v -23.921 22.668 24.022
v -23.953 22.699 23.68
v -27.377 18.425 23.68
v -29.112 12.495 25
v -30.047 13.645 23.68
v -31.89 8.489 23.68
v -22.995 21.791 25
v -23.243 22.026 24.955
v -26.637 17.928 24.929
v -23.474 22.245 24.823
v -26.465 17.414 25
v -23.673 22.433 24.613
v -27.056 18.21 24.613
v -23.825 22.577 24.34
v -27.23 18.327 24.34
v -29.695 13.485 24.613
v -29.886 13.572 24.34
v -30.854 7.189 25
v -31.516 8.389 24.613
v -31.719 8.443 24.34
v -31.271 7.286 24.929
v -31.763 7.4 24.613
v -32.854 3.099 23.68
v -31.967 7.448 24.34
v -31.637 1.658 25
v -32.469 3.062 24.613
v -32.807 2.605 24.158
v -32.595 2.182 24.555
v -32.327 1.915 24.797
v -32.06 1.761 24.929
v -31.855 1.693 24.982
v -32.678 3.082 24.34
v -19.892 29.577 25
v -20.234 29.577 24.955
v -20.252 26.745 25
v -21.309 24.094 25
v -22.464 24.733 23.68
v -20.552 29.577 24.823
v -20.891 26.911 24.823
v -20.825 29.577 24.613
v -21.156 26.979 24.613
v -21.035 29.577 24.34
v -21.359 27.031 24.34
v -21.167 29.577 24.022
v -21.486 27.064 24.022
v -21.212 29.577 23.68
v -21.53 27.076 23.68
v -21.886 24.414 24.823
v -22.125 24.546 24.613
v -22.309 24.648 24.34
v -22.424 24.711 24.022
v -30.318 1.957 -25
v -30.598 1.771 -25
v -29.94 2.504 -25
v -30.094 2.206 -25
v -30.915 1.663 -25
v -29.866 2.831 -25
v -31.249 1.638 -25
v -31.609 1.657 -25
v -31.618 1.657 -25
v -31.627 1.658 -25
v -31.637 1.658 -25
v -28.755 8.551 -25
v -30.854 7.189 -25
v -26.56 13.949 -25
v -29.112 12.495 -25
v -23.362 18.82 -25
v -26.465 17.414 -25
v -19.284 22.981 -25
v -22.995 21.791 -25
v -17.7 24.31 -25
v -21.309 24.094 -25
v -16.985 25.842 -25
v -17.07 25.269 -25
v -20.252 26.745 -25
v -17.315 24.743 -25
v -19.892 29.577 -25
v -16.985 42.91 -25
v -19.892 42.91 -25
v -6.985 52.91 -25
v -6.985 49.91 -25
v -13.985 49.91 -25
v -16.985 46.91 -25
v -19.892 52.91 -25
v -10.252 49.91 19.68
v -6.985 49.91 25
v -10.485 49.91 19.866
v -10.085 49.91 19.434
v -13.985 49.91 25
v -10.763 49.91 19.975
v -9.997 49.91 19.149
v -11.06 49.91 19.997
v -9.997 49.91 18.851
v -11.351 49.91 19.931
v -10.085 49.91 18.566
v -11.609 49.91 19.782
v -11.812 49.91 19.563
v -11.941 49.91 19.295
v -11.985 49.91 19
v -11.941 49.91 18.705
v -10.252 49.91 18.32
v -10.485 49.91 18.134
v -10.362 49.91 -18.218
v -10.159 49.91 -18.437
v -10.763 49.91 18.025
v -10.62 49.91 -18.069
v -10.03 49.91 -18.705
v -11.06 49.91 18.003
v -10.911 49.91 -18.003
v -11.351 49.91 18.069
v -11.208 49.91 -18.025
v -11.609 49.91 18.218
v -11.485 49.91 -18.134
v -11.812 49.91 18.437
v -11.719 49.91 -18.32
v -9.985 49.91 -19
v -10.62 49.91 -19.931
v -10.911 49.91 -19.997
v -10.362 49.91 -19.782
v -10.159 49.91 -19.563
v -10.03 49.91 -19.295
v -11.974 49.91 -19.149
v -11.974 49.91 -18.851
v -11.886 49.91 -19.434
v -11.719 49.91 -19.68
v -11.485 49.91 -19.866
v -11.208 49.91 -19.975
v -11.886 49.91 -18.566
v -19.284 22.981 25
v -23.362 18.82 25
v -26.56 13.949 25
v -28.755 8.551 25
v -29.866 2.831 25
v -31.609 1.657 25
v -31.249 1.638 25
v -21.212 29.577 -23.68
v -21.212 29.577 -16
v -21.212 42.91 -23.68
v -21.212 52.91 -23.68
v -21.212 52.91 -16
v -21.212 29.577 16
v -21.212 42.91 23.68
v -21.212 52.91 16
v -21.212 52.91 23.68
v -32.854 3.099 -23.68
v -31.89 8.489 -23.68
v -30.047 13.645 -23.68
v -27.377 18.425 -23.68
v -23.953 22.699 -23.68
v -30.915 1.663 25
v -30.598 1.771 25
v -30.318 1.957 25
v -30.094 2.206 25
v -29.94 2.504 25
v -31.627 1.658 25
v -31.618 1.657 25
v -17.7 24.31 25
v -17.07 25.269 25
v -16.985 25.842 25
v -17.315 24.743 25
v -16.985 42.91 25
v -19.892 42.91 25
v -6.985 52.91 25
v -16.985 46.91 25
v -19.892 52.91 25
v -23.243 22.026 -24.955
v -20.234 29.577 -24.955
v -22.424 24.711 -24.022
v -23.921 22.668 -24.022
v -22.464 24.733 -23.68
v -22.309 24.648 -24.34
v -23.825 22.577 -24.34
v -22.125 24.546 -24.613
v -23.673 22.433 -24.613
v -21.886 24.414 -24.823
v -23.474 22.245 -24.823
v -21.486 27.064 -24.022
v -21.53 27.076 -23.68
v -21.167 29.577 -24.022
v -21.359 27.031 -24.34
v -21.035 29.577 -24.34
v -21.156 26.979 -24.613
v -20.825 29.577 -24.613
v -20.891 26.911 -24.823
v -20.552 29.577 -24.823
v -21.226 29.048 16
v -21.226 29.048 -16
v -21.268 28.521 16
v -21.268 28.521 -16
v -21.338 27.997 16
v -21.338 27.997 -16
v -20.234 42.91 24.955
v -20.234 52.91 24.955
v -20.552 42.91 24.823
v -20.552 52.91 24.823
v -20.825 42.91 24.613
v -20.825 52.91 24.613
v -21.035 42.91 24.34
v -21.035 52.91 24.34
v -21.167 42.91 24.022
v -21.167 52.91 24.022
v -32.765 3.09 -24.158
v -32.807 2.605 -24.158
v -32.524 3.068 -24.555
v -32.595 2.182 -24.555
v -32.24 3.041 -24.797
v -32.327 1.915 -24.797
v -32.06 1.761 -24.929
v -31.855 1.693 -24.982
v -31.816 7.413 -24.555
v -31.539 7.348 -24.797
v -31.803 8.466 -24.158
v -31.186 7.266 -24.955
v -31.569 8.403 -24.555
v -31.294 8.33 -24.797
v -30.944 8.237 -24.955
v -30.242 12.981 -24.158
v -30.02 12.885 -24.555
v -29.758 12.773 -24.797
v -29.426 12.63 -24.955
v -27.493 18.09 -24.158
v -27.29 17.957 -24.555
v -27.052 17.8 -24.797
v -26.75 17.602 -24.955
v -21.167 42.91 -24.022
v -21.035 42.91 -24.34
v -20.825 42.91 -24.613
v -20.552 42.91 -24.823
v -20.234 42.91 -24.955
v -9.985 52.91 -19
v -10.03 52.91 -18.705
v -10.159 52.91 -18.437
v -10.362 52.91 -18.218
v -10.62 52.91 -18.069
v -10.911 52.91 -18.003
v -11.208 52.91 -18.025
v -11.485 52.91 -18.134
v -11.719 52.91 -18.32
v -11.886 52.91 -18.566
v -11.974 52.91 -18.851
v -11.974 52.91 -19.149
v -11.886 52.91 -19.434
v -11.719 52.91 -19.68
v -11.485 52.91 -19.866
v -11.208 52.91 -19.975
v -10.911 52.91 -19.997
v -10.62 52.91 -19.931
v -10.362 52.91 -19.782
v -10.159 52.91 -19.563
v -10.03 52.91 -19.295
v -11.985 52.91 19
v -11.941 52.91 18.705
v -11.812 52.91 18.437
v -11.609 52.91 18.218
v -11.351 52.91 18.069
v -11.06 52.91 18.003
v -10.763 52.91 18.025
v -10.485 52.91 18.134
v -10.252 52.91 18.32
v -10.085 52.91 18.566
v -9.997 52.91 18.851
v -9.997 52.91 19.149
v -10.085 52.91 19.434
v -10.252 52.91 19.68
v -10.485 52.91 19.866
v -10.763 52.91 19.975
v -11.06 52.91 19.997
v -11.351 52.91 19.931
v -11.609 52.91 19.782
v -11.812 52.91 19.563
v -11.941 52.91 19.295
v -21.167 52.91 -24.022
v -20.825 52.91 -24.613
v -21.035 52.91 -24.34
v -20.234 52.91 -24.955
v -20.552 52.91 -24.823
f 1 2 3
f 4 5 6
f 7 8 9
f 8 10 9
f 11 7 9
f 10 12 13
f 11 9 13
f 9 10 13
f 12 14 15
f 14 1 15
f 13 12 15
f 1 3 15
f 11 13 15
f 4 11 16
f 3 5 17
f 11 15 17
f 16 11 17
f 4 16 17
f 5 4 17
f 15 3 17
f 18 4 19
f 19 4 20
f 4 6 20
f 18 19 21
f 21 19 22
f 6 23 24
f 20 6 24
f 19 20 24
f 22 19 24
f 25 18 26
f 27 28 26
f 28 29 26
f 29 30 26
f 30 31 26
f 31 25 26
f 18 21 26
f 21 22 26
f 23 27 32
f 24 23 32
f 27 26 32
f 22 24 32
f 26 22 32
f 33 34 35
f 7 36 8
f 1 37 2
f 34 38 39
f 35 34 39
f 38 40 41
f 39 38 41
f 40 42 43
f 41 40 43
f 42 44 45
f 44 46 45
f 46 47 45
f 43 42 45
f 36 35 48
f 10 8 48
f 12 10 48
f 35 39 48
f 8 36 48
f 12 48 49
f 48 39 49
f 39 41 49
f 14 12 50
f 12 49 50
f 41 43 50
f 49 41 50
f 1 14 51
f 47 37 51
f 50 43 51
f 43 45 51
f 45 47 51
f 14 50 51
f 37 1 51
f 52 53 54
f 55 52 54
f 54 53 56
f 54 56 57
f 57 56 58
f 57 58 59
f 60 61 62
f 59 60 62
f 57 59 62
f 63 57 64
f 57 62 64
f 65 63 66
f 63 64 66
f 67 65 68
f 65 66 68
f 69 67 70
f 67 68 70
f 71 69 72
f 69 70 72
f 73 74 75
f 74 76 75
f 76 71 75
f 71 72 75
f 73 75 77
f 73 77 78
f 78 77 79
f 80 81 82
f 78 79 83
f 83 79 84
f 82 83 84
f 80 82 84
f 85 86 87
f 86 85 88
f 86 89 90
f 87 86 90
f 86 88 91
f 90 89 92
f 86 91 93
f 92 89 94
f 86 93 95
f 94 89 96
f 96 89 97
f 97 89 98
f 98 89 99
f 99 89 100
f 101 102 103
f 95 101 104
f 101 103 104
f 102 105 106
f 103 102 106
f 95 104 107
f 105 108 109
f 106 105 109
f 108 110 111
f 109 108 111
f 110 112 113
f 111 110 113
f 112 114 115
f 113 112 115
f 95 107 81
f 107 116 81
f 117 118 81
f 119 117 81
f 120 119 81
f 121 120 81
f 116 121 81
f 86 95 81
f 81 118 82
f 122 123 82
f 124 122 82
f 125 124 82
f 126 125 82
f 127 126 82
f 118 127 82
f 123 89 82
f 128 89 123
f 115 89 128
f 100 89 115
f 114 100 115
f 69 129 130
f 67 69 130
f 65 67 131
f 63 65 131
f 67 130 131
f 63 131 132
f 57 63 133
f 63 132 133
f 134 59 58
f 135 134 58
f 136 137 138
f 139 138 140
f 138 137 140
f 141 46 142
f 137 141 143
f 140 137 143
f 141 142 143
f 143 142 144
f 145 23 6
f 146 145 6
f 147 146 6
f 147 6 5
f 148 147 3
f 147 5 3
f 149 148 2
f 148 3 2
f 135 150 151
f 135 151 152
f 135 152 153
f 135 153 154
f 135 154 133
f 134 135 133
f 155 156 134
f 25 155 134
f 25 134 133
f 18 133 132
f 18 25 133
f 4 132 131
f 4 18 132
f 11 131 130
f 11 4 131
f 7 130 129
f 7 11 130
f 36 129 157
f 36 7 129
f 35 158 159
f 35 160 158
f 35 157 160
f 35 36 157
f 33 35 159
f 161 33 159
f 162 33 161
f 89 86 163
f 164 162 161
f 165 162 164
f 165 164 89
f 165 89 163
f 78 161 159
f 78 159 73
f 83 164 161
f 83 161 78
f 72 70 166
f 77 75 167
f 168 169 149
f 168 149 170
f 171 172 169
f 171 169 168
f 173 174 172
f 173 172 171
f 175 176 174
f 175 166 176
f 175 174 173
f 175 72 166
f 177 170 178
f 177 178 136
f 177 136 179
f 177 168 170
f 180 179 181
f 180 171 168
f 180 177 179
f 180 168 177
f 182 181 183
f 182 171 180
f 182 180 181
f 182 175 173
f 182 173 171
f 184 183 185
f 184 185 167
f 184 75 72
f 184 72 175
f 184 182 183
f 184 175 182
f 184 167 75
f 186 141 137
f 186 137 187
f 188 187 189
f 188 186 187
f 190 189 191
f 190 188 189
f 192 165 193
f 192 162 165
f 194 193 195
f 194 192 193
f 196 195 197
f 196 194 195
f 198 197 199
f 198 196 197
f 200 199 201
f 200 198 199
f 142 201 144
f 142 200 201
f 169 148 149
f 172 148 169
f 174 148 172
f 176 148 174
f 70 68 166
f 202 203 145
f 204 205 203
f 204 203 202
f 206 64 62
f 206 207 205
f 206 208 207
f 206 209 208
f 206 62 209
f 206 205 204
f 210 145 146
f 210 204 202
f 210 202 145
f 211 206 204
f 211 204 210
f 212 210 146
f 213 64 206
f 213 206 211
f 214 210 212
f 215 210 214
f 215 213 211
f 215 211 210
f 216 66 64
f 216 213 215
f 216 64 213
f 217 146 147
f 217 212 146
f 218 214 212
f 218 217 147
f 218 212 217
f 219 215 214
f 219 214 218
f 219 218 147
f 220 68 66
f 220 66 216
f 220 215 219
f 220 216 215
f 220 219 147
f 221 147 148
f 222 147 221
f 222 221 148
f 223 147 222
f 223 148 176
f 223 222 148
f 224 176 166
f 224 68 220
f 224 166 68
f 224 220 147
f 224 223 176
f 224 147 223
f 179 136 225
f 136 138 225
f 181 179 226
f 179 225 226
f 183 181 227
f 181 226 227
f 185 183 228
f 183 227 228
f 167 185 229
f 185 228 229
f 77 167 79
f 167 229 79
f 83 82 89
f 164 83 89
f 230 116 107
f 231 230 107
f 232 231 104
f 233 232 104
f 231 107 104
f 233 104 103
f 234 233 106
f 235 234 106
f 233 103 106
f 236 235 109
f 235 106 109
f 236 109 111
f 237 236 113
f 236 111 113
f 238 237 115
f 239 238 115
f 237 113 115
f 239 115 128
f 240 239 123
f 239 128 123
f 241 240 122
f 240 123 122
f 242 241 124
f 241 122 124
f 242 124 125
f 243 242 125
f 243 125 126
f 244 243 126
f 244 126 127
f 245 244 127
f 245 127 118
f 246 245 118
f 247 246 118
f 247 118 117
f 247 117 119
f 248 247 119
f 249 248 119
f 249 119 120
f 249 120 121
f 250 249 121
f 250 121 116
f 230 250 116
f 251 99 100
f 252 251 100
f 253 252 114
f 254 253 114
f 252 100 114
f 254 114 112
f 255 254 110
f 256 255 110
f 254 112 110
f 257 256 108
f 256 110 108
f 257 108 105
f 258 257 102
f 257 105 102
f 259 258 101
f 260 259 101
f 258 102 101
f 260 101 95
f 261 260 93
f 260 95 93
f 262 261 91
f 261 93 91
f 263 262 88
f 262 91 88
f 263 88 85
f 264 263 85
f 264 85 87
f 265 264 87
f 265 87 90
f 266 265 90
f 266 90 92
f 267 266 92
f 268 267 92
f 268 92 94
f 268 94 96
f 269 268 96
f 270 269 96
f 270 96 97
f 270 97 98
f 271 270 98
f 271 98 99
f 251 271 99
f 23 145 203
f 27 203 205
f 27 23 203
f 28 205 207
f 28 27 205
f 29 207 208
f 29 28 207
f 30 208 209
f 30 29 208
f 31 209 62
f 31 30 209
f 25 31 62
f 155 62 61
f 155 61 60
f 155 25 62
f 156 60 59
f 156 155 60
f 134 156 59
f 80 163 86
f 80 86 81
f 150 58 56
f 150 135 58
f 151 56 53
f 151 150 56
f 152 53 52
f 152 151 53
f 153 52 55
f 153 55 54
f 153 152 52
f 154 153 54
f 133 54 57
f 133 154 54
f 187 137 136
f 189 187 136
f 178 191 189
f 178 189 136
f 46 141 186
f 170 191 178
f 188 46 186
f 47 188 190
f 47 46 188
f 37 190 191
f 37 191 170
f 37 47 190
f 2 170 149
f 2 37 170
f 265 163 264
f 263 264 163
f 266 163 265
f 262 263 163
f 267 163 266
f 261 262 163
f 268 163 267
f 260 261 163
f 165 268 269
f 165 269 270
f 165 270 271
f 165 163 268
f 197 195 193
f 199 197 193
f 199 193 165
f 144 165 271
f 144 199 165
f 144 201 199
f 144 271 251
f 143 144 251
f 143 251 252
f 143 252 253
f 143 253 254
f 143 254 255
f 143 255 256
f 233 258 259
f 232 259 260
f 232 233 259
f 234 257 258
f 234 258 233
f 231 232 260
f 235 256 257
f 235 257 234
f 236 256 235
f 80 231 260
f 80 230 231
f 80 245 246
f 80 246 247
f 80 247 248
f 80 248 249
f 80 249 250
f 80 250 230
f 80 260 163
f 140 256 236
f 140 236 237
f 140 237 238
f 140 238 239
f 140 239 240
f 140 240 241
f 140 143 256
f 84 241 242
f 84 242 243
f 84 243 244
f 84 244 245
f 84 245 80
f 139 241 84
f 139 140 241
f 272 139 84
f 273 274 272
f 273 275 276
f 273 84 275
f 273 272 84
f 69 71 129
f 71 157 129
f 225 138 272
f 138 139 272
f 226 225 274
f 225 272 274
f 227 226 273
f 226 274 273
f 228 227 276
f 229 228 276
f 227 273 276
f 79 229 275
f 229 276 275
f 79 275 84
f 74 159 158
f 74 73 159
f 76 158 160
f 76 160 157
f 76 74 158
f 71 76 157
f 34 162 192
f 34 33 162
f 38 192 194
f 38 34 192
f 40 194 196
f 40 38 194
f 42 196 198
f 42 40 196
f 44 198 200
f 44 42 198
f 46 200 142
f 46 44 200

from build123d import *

# Parameters (mm, degrees)
EXTRUDE_1_DEPTH             = 25
EXTRUDE_3_DEPTH             = 25
CUT_EXTRUDE_1_DEPTH         = 53.179559149
CUT_EXTRUDE_1_DEPTH_BACK    = 53.179559149
SKETCH_4_W                  = 32
SKETCH_4_H                  = 14.912747354
FILLET_1_R                  = 10
FILLET_17_R                 = 2
CUT_EXTRUDE_5_DEPTH         = 60.625850278
CUT_EXTRUDE_5_DEPTH_BACK    = 60.625850278
CUT_EXTRUDE_6_DEPTH         = 60.600832153
CUT_EXTRUDE_6_DEPTH_BACK    = 60.600832153
SKETCH_9_W                  = 7
SKETCH_9_H                  = 3
SKETCH_10_W                 = 4.226496159
SKETCH_10_H                 = 9
EXTRUDE_4_DEPTH             = 10
SKETCH_12_W                 = 50
SKETCH_12_H                 = 3
EXTRUDE_6_DEPTH             = 10
EXTRUDE_6_DIRECTION_2_REACH = 62.659
SKETCH_14_R                 = 1
CUT_EXTRUDE_8_DEPTH         = 64.621818473
FILLET_50_R                 = 1.32
SKETCH_16_W                 = 32
SKETCH_16_H                 = 21.912747354
EXTRUDE_7_DEPTH             = 4.226496158
EXTRUDE_START               = 32
EXTRUDE_8_DEPTH             = 32
CHAMFER_1_SIZE              = 3


with BuildPart() as part:
    # 草图1 → 凸台-拉伸1 (new, symmetric)
    with BuildSketch(Plane.XY):
        with BuildLine():
            ThreePointArc((-33, 0), (-29.908156972, 13.946402637), (-21.21199112, 25.279466623))
            Line((-21.21199112, 25.279466623), (-16.985494961, 24.909696123))
            Line((-16.985494961, 24.909696123), (-19.283628291, 22.981333294))
            ThreePointArc((-19.283628291, 22.981333294), (-27.189233611, 12.678547852), (-30, 0))
            Line((-30, 0), (-33, 0))
        make_face()
    extrude(amount=EXTRUDE_1_DEPTH, both=True)

    # 草图1<7> → 凸台-拉伸3 (add, symmetric)
    with BuildSketch(Plane.XY):
        Polygon((-21.21199112, 25.279466623), (-21.21199112, 39.909696123), (-28.21199112, 39.909696123), (-28.21199112, 42.909696123), (-16.985494961, 42.909696123), (-16.985494961, 39.909696123), (-16.985494961, 24.909696123), align=None)
    extrude(amount=EXTRUDE_3_DEPTH, both=True)

    # 草图4 → 切除-拉伸1 (cut, two sides: drawn at the far end of the back side and taken through both)
    with BuildSketch(Plane(origin=(-16.985494961, 0, 0), x_dir=(0, 0, -1), z_dir=(1, 0, 0)).offset(-CUT_EXTRUDE_1_DEPTH_BACK)):
        with Locations((0, 35.453322446)):
            Rectangle(SKETCH_4_W, SKETCH_4_H)
    extrude(amount=CUT_EXTRUDE_1_DEPTH + CUT_EXTRUDE_1_DEPTH_BACK, mode=Mode.SUBTRACT)

    # 圆角1
    # the kernel refuses this fillet: 10 mm, written as the material it adds along each edge
    with BuildSketch(Plane(origin=(-21.21199112, 25.279466623, 25), x_dir=(-0.7281290100330119, -0.6854401102564294, 0), z_dir=(0, 0, -1))) as fillet_1_piece_1_section:
        with BuildLine():
            CenterArc((4.335441405, 9.983715921), FILLET_1_R, 223.270229162, 43.459541677)
            Line((-2.945848695, 3.129314818), (0, 0))
            ThreePointArc((0, 0), (1.882494294, 0.053737462), (3.764988589, 0))
        make_face()
    fillet_1_piece_1 = extrude(amount=50, mode=Mode.PRIVATE)
    fillet_1_piece_1 = split(fillet_1_piece_1, bisect_by=Plane(origin=(-21.85438977, 25.398045646, 16), z_dir=(0, 0, 1)), keep=Keep.TOP, mode=Mode.PRIVATE)
    fillet_1_piece_1 = split(fillet_1_piece_1, bisect_by=Plane(origin=(-21.85438977, 27.996948769, 20.5), z_dir=(0, -1, 0)), keep=Keep.TOP, mode=Mode.PRIVATE)
    add(fillet_1_piece_1)
    with BuildSketch(Plane(origin=(-21.21199112, 25.279466623, 25), x_dir=(-0.7281290100330119, -0.6854401102564294, 0), z_dir=(0, 0, -1))) as fillet_1_piece_2_section:
        with BuildLine():
            CenterArc((4.335441405, 9.983715921), FILLET_1_R, 223.270229162, 43.459541677)
            Line((-2.945848695, 3.129314818), (0, 0))
            ThreePointArc((0, 0), (1.882494294, 0.053737462), (3.764988589, 0))
        make_face()
    fillet_1_piece_2 = extrude(amount=50, mode=Mode.PRIVATE)
    fillet_1_piece_2 = split(fillet_1_piece_2, bisect_by=Plane(origin=(-21.135777092, 28.718730095, 16), z_dir=(0, 0, 1)), keep=Keep.TOP, mode=Mode.PRIVATE)
    fillet_1_piece_2 = split(fillet_1_piece_2, bisect_by=Plane(origin=(-21.135777092, 27.996948769, 20.5), z_dir=(0, 1, 0)), keep=Keep.TOP, mode=Mode.PRIVATE)
    add(fillet_1_piece_2)
    with BuildSketch(Plane(origin=(-21.21199112, 25.279466623, 25), x_dir=(-0.7281290100330119, -0.6854401102564294, 0), z_dir=(0, 0, -1))) as fillet_1_piece_3_section:
        with BuildLine():
            CenterArc((4.335441405, 9.983715921), FILLET_1_R, 223.270229162, 43.459541677)
            Line((-2.945848695, 3.129314818), (0, 0))
            ThreePointArc((0, 0), (1.882494294, 0.053737462), (3.764988589, 0))
        make_face()
    fillet_1_piece_3 = extrude(amount=50, mode=Mode.PRIVATE)
    fillet_1_piece_3 = split(fillet_1_piece_3, bisect_by=Plane(origin=(-21.85438977, 25.398045646, 16), z_dir=(0, 0, -1)), keep=Keep.TOP, mode=Mode.PRIVATE)
    fillet_1_piece_3 = split(fillet_1_piece_3, bisect_by=Plane(origin=(-21.85438977, 27.996948769, 0), z_dir=(0, -1, 0)), keep=Keep.TOP, mode=Mode.PRIVATE)
    fillet_1_piece_3 = split(fillet_1_piece_3, bisect_by=Plane(origin=(-21.85438977, 25.398045646, -16), z_dir=(0, 0, 1)), keep=Keep.TOP, mode=Mode.PRIVATE)
    add(fillet_1_piece_3)
    with BuildSketch(Plane(origin=(-21.21199112, 25.279466623, 25), x_dir=(-0.7281290100330119, -0.6854401102564294, 0), z_dir=(0, 0, -1))) as fillet_1_piece_4_section:
        with BuildLine():
            CenterArc((4.335441405, 9.983715921), FILLET_1_R, 223.270229162, 43.459541677)
            Line((-2.945848695, 3.129314818), (0, 0))
            ThreePointArc((0, 0), (1.882494294, 0.053737462), (3.764988589, 0))
        make_face()
    fillet_1_piece_4 = extrude(amount=50, mode=Mode.PRIVATE)
    fillet_1_piece_4 = split(fillet_1_piece_4, bisect_by=Plane(origin=(-21.85438977, 27.996948769, -20.5), z_dir=(0, -1, 0)), keep=Keep.TOP, mode=Mode.PRIVATE)
    fillet_1_piece_4 = split(fillet_1_piece_4, bisect_by=Plane(origin=(-21.85438977, 25.398045646, -16), z_dir=(0, 0, -1)), keep=Keep.TOP, mode=Mode.PRIVATE)
    add(fillet_1_piece_4)
    with BuildSketch(Plane(origin=(-21.21199112, 25.279466623, 25), x_dir=(-0.7281290100330119, -0.6854401102564294, 0), z_dir=(0, 0, -1))) as fillet_1_piece_5_section:
        with BuildLine():
            CenterArc((4.335441405, 9.983715921), FILLET_1_R, 223.270229162, 43.459541677)
            Line((-2.945848695, 3.129314818), (0, 0))
            ThreePointArc((0, 0), (1.882494294, 0.053737462), (3.764988589, 0))
        make_face()
    fillet_1_piece_5 = extrude(amount=50, mode=Mode.PRIVATE)
    fillet_1_piece_5 = split(fillet_1_piece_5, bisect_by=Plane(origin=(-21.135777092, 27.996948769, -20.5), z_dir=(0, 1, 0)), keep=Keep.TOP, mode=Mode.PRIVATE)
    fillet_1_piece_5 = split(fillet_1_piece_5, bisect_by=Plane(origin=(-21.135777092, 28.718730095, -16), z_dir=(0, 0, -1)), keep=Keep.TOP, mode=Mode.PRIVATE)
    add(fillet_1_piece_5)

    # 圆角17
    fillet_17_edges = [part.edges().sort_by_distance(p)[0] for p in [
        (-16.985494961, 24.909696123, 0),
    ]]
    fillet(fillet_17_edges, radius=FILLET_17_R)

    # 草图7 → 切除-拉伸5 (cut, two sides: drawn at the far end of the back side and taken through both)
    with BuildSketch(Plane.XY.offset(-CUT_EXTRUDE_5_DEPTH_BACK)):
        with BuildLine():
            Line((0, 0), (-33, 0))
            ThreePointArc((-33, 0), (-32.988691724, 0.863839294), (-32.954774647, 1.727086556))
            Line((-32.954774647, 1.727086556), (0, 0))
        make_face()
    extrude(amount=CUT_EXTRUDE_5_DEPTH + CUT_EXTRUDE_5_DEPTH_BACK, mode=Mode.SUBTRACT)

    # 草图9 → 切除-拉伸6 (cut, two sides: drawn at the far end of the back side and taken through both)
    with BuildSketch(Plane.XY.offset(-CUT_EXTRUDE_6_DEPTH_BACK)):
        with Locations((-24.71199112, 41.409696123)):
            Rectangle(SKETCH_9_W, SKETCH_9_H)
    extrude(amount=CUT_EXTRUDE_6_DEPTH + CUT_EXTRUDE_6_DEPTH_BACK, mode=Mode.SUBTRACT)

    # 草图10 → 凸台-拉伸4 (add)
    with BuildSketch(Plane(origin=(0, 42.909696123, 0), x_dir=(1, 0, 0), z_dir=(0, 1, 0))):
        with Locations((-19.098743041, 20.5)):
            Rectangle(SKETCH_10_W, SKETCH_10_H)
        with Locations((-19.098743041, -20.5)):
            Rectangle(SKETCH_10_W, SKETCH_10_H)
    extrude(amount=EXTRUDE_4_DEPTH)

    # 草图12 → 凸台-拉伸6 (add)
    with BuildSketch(Plane(origin=(-16.985494961, 0, 0), x_dir=(0, 0, -1), z_dir=(1, 0, 0))):
        with Locations((0, 51.409696123)):
            Rectangle(SKETCH_12_W, SKETCH_12_H)
    extrude(amount=EXTRUDE_6_DEPTH)

    # 凸台-拉伸6 direction 2: up to this face of the body (flat: up to its plane)
    extrude_6_direction_2_end = Plane(part.part.faces().sort_by_distance((-21.21199112, 41.24345525, 20.5))[0])
    # 草图12 → 凸台-拉伸6 direction 2 (add, up to the picked face)
    with BuildSketch(Plane(origin=(-16.985494961, 0, 0), x_dir=(0, 0, -1), z_dir=(1, 0, 0)), mode=Mode.PRIVATE) as extrude_6_direction_2_sk1:
        with Locations((0, 51.409696123)):
            Rectangle(SKETCH_12_W, SKETCH_12_H)
    extrude_6_direction_2_tool1 = split(extrude(extrude_6_direction_2_sk1.sketch, amount=-EXTRUDE_6_DIRECTION_2_REACH, mode=Mode.PRIVATE), bisect_by=extrude_6_direction_2_end, keep=Keep.BOTH, mode=Mode.PRIVATE)
    add(extrude_6_direction_2_tool1.solids().sort_by(Axis((-16.985495, 51.409696, 0), (-1, 0, 0)))[0])

    # 草图14 → 切除-拉伸8 (cut, through all)
    with BuildSketch(Plane(origin=(0, 49.909696123, 0), x_dir=(-1, 0, 0), z_dir=(0, -1, 0))):
        with Locations(Location((10.985494961, 19, 0), (0, 0, 180))):
            Circle(SKETCH_14_R)
        with Locations((10.985494961, -19)):
            Circle(SKETCH_14_R)
    extrude(amount=-CUT_EXTRUDE_8_DEPTH, mode=Mode.SUBTRACT)

    # 圆角50
    fillet_50_edges = [part.edges().sort_by_distance(p)[0] for p in [
        (-21.21199112, 41.24345525, -25),
        (-21.21199112, 41.24345525, 25),
        (-21.922587859, 25.874919539, -25),
        (-21.922587859, 25.874919539, 25),
        (-30.324707269, 13.015841465, -25),
        (-30.324707269, 13.015841465, 25),
        (-29.958886043, 1.570078687, 0),
        (-32.954774647, 1.727086556, 0),
    ]]
    fillet(fillet_50_edges, radius=FILLET_50_R)

    # 草图16 → 凸台-拉伸7 (add)
    with BuildSketch(Plane(origin=(-16.985494961, 0, 0), x_dir=(0, 0, -1), z_dir=(1, 0, 0))):
        with Locations((0, 38.953322446)):
            Rectangle(SKETCH_16_W, SKETCH_16_H)
    extrude(amount=-EXTRUDE_7_DEPTH)

    # 草图17 → 凸台-拉伸8 (add)
    with BuildSketch(Plane.XY.offset(-16).offset(EXTRUDE_START)):
        with BuildLine():
            Line((-21.337642503, 27.996948769), (-21.21199112, 27.996948769))
            Line((-21.21199112, 27.996948769), (-21.21199112, 29.577214378))
            ThreePointArc((-21.21199112, 29.577214378), (-21.243453459, 28.784587785), (-21.337642503, 27.996948769))
        make_face()
    extrude(amount=-EXTRUDE_8_DEPTH)

    # 倒角1
    chamfer_1_edges = [part.edges().sort_by_distance(p)[0] for p in [
        (-16.985494961, 49.909696123, 0),
    ]]
    chamfer(chamfer_1_edges, length=CHAMFER_1_SIZE)


solid = part.part
